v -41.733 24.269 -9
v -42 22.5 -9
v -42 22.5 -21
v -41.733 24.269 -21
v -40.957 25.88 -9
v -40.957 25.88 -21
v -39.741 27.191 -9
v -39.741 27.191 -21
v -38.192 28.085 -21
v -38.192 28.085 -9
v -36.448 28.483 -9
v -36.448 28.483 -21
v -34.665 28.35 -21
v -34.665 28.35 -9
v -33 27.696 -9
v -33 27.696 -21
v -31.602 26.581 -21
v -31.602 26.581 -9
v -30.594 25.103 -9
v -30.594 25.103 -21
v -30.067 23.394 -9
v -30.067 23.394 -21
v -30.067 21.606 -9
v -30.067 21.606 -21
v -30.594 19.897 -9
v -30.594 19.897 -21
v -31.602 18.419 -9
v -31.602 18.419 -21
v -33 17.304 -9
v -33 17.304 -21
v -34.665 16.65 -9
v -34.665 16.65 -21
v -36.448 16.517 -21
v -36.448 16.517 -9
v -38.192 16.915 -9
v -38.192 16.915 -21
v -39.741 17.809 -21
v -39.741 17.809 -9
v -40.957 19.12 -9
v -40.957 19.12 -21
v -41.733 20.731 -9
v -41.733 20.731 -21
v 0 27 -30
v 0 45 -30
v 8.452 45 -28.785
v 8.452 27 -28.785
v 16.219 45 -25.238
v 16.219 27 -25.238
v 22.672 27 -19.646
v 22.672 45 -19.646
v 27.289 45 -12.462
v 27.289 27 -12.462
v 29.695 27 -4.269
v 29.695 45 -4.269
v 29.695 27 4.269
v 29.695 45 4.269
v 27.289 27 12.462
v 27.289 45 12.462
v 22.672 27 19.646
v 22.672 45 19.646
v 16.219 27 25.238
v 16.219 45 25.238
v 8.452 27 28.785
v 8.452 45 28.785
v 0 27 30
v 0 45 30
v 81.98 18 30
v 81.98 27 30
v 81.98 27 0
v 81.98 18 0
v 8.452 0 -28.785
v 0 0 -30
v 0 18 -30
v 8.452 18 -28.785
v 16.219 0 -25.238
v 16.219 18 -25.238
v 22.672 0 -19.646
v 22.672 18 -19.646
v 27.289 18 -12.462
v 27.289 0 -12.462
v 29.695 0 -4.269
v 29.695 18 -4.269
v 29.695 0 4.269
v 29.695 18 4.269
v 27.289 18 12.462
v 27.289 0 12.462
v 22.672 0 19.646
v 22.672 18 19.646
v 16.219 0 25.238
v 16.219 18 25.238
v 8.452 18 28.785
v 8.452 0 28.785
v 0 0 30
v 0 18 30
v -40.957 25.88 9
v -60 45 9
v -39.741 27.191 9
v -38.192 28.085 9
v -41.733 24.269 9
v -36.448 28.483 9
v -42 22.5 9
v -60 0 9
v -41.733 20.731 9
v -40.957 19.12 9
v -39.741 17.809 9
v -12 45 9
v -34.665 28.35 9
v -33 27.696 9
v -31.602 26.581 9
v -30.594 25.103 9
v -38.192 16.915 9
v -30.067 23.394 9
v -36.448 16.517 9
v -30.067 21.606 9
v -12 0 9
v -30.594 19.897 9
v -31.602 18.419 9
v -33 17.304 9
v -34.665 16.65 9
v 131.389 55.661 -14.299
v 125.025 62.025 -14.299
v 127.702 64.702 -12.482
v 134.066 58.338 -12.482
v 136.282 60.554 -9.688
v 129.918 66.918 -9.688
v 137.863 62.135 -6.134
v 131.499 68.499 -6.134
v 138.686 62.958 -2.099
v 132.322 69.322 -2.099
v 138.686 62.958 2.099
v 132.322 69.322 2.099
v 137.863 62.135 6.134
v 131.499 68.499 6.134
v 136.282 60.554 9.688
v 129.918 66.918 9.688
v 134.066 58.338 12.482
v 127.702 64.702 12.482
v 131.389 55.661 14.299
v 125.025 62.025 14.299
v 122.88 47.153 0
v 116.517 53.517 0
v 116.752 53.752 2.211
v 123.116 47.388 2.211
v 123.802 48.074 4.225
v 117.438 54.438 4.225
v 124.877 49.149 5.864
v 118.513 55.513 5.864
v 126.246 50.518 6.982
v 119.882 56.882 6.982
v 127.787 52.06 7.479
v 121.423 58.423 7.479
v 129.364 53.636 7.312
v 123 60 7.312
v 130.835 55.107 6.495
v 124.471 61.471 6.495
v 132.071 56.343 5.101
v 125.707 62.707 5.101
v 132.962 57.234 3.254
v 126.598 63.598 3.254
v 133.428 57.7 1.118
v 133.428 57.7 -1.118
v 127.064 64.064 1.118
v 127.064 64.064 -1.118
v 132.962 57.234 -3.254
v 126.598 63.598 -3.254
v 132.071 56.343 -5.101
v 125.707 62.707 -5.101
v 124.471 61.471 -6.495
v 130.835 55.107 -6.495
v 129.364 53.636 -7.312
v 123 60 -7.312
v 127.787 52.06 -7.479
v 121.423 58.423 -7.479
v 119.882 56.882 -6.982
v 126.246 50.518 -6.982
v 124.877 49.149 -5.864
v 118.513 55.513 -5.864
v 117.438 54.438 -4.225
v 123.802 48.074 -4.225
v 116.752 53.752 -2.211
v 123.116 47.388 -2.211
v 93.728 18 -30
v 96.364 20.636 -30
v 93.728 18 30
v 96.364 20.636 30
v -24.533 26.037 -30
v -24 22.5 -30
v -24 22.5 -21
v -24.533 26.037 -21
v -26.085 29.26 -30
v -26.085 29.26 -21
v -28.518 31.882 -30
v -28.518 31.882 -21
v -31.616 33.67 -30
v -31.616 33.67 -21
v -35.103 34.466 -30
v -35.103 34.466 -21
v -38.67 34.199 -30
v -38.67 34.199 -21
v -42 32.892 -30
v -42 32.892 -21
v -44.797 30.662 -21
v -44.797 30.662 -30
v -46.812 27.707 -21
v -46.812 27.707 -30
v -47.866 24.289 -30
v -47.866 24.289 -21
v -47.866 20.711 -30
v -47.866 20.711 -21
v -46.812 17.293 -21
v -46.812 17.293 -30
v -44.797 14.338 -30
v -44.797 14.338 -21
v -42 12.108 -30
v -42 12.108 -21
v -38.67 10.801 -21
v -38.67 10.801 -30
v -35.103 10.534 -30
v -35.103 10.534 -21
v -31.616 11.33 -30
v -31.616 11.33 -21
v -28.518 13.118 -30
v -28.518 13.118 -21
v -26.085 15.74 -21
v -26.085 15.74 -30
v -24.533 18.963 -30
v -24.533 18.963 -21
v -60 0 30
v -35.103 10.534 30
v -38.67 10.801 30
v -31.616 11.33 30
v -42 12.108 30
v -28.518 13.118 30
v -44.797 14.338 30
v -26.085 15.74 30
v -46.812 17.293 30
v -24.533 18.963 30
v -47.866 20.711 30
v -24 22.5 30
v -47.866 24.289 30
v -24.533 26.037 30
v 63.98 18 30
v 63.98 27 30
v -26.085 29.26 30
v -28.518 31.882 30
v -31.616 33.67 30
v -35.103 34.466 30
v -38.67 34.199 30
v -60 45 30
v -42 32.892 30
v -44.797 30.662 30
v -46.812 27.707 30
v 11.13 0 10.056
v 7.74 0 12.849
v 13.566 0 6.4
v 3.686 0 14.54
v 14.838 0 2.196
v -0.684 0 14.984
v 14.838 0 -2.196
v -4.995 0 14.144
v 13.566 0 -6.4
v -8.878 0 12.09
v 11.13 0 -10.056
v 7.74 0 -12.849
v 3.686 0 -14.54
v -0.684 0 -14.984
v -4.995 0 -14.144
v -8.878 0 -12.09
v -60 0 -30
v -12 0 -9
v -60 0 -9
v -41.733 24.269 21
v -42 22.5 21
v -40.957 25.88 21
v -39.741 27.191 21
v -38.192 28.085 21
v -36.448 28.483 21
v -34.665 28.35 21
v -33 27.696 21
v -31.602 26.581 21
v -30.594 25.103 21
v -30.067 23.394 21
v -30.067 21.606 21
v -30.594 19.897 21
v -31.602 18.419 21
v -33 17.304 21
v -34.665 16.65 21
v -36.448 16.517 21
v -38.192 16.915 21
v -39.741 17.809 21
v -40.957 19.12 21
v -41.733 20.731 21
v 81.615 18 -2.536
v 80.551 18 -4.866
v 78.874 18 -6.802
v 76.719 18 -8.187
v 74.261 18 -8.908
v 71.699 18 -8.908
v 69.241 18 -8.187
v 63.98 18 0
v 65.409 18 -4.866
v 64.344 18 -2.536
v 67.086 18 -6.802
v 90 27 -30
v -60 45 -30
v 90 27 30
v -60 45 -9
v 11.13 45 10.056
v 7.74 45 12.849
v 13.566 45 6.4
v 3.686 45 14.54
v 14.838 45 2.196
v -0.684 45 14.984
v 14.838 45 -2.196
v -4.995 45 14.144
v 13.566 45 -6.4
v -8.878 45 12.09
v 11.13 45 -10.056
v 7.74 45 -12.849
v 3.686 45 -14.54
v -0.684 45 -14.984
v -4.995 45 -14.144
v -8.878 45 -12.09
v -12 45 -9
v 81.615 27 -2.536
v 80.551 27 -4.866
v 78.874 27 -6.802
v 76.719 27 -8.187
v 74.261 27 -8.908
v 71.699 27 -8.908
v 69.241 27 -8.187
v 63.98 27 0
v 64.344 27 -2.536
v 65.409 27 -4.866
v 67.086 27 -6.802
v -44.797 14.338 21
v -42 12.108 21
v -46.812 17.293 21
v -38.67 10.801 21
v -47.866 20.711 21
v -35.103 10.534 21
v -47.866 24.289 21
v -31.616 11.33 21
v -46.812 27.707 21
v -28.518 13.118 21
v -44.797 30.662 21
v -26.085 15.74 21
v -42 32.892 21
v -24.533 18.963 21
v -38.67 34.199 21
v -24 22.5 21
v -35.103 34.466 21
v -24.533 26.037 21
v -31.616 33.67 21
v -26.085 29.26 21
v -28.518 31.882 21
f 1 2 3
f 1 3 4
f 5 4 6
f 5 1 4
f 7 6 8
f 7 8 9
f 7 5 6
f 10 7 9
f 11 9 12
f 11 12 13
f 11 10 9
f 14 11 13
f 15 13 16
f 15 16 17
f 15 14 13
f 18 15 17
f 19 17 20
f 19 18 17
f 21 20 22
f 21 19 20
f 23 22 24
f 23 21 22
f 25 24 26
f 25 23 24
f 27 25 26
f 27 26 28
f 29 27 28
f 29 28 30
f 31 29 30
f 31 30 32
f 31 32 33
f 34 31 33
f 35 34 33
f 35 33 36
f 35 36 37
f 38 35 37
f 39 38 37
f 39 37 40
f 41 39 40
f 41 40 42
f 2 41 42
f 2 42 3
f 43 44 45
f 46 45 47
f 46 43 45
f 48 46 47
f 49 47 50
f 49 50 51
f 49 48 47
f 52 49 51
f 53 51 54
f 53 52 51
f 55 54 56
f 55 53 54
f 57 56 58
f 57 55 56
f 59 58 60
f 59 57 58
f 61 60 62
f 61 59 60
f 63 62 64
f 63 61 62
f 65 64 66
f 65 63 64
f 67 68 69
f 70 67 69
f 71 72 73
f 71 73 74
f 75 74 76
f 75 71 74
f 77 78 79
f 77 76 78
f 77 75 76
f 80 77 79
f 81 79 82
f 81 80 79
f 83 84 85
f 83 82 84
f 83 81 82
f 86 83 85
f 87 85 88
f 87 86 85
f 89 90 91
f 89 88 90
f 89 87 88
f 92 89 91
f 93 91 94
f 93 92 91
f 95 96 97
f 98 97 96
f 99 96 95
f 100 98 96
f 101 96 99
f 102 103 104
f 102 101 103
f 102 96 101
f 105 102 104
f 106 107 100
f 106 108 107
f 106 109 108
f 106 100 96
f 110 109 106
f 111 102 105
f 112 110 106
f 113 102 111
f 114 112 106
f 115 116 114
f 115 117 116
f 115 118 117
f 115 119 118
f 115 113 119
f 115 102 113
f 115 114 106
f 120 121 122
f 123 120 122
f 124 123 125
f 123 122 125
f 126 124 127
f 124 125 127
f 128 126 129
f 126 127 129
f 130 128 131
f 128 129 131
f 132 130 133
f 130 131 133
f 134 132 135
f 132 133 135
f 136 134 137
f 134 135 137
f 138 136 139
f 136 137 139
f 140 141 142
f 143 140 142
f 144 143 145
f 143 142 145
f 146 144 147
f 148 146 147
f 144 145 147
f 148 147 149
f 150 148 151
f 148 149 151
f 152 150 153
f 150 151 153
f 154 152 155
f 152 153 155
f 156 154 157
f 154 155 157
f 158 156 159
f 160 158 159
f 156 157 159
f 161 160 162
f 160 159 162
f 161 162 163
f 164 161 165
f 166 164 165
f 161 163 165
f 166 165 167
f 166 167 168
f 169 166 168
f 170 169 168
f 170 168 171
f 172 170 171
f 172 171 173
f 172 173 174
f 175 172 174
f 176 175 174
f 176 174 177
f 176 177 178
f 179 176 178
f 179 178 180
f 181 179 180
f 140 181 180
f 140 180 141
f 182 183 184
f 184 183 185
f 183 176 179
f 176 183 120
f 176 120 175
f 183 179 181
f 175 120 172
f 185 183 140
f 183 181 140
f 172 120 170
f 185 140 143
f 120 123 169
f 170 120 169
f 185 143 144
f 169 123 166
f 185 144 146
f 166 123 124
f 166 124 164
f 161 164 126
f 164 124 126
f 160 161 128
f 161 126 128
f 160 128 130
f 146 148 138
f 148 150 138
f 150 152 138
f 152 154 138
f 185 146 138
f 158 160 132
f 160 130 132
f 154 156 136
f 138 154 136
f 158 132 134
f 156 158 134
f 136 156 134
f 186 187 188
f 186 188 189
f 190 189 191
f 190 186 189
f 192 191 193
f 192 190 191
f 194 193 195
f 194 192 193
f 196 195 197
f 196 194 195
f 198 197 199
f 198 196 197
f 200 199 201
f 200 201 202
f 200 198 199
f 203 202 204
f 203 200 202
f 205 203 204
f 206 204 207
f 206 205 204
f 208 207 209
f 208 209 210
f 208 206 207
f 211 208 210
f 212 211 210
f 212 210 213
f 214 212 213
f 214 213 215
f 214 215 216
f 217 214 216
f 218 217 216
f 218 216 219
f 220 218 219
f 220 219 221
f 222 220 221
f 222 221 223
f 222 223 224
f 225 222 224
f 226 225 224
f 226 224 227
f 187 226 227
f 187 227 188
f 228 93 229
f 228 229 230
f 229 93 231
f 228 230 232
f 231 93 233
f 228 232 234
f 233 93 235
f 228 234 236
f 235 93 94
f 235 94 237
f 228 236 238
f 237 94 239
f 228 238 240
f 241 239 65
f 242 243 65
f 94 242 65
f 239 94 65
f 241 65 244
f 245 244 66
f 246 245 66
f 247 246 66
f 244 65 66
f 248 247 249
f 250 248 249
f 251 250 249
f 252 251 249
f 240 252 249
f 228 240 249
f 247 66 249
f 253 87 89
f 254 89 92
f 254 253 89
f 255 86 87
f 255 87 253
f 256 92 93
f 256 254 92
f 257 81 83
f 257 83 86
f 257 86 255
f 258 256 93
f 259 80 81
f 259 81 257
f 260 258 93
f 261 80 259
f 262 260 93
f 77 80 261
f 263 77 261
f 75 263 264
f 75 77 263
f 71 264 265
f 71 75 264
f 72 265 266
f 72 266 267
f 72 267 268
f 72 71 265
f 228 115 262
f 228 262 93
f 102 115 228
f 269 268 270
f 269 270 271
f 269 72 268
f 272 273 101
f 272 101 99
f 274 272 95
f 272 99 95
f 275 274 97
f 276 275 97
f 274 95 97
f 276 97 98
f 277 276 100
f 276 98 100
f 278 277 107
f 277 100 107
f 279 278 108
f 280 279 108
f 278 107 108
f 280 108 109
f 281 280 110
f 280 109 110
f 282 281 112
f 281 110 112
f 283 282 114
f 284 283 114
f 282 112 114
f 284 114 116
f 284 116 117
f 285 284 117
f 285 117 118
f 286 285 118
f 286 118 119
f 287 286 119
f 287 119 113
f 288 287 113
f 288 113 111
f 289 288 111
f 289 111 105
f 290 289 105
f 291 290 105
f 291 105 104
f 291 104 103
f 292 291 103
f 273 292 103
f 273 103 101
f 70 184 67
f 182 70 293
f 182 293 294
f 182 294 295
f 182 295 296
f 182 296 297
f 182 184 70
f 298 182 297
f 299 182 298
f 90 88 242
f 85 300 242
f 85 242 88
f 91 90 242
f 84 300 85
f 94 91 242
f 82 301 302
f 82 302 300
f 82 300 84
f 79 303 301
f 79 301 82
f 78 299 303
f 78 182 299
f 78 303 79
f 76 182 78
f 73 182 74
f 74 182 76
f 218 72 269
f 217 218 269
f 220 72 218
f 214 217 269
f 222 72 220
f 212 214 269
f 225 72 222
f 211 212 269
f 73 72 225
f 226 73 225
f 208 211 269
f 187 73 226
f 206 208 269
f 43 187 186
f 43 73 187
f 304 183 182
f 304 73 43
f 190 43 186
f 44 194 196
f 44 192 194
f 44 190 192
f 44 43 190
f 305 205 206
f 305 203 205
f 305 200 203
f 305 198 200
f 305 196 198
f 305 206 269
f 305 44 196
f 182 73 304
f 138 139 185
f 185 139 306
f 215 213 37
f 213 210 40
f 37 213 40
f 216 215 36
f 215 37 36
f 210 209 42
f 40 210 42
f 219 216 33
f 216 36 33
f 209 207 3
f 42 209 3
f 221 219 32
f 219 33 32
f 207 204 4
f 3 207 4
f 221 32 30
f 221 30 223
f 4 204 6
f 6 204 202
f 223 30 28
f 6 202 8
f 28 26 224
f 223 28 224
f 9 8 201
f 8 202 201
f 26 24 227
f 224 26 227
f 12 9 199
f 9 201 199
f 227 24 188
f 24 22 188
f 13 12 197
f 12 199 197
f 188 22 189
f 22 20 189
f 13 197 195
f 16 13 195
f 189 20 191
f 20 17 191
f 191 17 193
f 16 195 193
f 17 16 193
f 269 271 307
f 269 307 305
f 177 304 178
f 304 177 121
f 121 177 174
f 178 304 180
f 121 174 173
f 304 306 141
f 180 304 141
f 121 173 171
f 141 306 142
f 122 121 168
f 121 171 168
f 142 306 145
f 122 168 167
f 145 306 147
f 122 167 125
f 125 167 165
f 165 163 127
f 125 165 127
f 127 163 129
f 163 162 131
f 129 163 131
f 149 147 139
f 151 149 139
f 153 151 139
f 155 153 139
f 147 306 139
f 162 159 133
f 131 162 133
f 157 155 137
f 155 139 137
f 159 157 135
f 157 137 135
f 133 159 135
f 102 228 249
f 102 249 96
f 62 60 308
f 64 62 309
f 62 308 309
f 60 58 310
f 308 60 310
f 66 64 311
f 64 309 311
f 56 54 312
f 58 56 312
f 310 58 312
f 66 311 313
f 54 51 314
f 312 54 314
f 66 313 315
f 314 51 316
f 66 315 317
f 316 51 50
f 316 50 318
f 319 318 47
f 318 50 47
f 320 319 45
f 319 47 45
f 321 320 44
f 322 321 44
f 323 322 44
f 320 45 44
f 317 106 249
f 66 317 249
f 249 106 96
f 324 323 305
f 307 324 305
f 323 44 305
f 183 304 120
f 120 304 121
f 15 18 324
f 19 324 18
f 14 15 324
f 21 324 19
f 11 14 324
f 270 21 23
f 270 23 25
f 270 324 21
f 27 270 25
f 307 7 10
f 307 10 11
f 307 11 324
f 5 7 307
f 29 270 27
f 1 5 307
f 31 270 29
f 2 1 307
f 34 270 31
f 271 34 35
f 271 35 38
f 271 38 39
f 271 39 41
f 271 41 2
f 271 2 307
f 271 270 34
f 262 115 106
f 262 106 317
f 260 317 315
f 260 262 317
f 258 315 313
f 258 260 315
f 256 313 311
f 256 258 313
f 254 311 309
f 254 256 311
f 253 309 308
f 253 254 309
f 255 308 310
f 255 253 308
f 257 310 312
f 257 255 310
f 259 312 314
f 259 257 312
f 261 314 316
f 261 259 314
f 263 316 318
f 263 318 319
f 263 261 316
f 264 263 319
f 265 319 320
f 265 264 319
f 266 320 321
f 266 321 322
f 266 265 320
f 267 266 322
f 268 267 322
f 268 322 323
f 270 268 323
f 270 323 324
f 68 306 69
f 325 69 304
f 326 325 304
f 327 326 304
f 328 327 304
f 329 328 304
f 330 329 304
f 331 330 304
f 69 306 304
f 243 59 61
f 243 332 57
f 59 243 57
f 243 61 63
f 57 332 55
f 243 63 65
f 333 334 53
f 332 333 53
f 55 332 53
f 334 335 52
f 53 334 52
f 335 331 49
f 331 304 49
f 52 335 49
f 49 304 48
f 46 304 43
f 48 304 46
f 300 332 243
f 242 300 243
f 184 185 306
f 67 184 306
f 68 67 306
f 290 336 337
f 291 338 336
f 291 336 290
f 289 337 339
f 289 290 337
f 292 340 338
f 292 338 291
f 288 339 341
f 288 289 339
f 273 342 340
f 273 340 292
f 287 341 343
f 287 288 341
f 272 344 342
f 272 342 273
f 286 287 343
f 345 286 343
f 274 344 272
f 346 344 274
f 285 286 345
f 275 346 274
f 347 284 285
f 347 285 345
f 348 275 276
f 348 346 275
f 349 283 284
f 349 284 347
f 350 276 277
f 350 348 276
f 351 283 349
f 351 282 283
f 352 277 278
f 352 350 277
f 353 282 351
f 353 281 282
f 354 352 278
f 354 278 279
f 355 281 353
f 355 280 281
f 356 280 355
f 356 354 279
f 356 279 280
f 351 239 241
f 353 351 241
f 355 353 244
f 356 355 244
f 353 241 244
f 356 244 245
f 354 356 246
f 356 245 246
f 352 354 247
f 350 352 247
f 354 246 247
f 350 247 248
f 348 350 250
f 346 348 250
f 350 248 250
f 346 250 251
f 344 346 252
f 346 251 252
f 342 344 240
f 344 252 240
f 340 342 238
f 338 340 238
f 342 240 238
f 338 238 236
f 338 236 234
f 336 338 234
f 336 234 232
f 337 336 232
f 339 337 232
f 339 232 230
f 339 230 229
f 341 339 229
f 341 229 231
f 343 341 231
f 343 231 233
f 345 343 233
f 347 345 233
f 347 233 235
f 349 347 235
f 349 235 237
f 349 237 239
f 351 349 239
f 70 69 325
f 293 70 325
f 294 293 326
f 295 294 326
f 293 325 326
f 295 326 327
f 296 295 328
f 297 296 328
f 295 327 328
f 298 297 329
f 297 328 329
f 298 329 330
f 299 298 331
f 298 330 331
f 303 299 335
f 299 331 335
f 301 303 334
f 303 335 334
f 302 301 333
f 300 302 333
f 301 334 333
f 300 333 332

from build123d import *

# Parameters (mm, degrees)
BOSS_EXTRUDE1_DEPTH                                  = 45
CBORE_FOR_M24_HEX_SOCKET_HEAD_CAP_SCREW1_D           = 12
CBORE_FOR_M24_HEX_SOCKET_HEAD_CAP_SCREW1_DEPTH       = 21
CBORE_FOR_M24_HEX_SOCKET_HEAD_CAP_SCREW1_CBORE_D     = 24
CBORE_FOR_M24_HEX_SOCKET_HEAD_CAP_SCREW1_CBORE_DEPTH = 9
BOSS_EXTRUDE2_DEPTH                                  = 4.5
BOSS_EXTRUDE3_DEPTH                                  = 9
SKETCH7_W                                            = 60
SKETCH7_H                                            = 9
BOSS_EXTRUDE4_DEPTH                                  = 9
CUT_EXTRUDE2_START                                   = -60
CUT_EXTRUDE2_DEPTH                                   = 60
SKETCH9_R                                            = 7.5
CUT_EXTRUDE3_DEPTH                                   = 151.324191827
CUT_EXTRUDE4_DEPTH                                   = 149.198401551


# Read off the part's stored shape, not the designer's step: Cut-Extrude2
with BuildPart() as part:
    # Sketch1 → Boss-Extrude1 (new body)
    with BuildSketch(Plane(origin=(0, 0, 0), x_dir=(1, 0, 0), z_dir=(0, 1, 0))):
        with BuildLine():
            Line((0, -30), (-60, -30))
            Line((-60, -30), (-60, -9))
            Line((-60, -9), (-12, -9))
            ThreePointArc((-12, -9), (15, 0), (-12, 9))
            Line((-12, 9), (-60, 9))
            Line((-60, 9), (-60, 30))
            Line((-60, 30), (0, 30))
            ThreePointArc((0, 30), (30, 0), (0, -30))
        make_face()
    extrude(amount=BOSS_EXTRUDE1_DEPTH)

    # CBORE for M24 Hex Socket Head Cap Screw1
    with Locations(Plane.XY.offset(30)):
        with Locations((-36, 22.5)):
            cbore_for_m24_hex_socket_head_cap_screw1 = CounterBoreHole(CBORE_FOR_M24_HEX_SOCKET_HEAD_CAP_SCREW1_D / 2, CBORE_FOR_M24_HEX_SOCKET_HEAD_CAP_SCREW1_CBORE_D / 2, CBORE_FOR_M24_HEX_SOCKET_HEAD_CAP_SCREW1_CBORE_DEPTH, depth=CBORE_FOR_M24_HEX_SOCKET_HEAD_CAP_SCREW1_DEPTH)

    # Mirror1: CBORE for M24 Hex Socket Head Cap Screw1 across plane
    add(cbore_for_m24_hex_socket_head_cap_screw1.mirror(Plane.XY), mode=Mode.SUBTRACT)

    # Sketch4 → Boss-Extrude2 (add, symmetric)
    with BuildSketch(Plane(origin=(0, 22.5, 0), x_dir=(1, 0, 0), z_dir=(0, 1, 0))):
        with BuildLine():
            Line((0, 30), (90, 30))
            Line((90, 30), (90, -30))
            Line((90, -30), (0, -30))
            ThreePointArc((0, -30), (30, 0), (0, 30))
        make_face()
    extrude(amount=BOSS_EXTRUDE2_DEPTH, both=True)



with BuildPart() as body_2:
    # Sketch6 → Boss-Extrude3 (new body)
    with BuildSketch(Plane(origin=(31.5, -31.5, 0), x_dir=(0.7071067811865462, 0.7071067811865489, 0), z_dir=(0.7071067811865489, -0.7071067811865462, 0))):
        with BuildLine():
            Line((82.731493399, 30), (82.731493399, -30))
            Line((82.731493399, -30), (132.264035588, -14.298813283))
            ThreePointArc((132.264035588, -14.298813283), (142.731493399, 0), (132.264035588, 14.298813283))
            Line((132.264035588, 14.298813283), (82.731493399, 30))
        make_face()
    extrude(amount=BOSS_EXTRUDE3_DEPTH)


with BuildPart() as part_1:
    add(part.part)

    add(body_2.part)  # Boss-Extrude4 merges body 2
    # Sketch7 → Boss-Extrude4 (add)
    with BuildSketch(Plane(origin=(58.5, 58.5, 0), x_dir=(0, 0, 1), z_dir=(-0.7071067811865462, -0.7071067811865488, 0))):
        with Locations((0, -49.047727215)):
            Rectangle(SKETCH7_W, SKETCH7_H)
    extrude(amount=BOSS_EXTRUDE4_DEPTH)

    # Cut-Extrude2 outline → Cut-Extrude2 (cut)
    with BuildSketch(Plane.XY.offset(30).offset(CUT_EXTRUDE2_START)):
        Polygon((90, 14.272077939), (93.727922061, 18), (86.272077939, 18), align=None)
    extrude(amount=CUT_EXTRUDE2_DEPTH, mode=Mode.SUBTRACT)

    # Sketch9 → Cut-Extrude3 (cut, through all)
    with BuildSketch(Plane(origin=(31.5, -31.5, 0), x_dir=(0, 0, 1), z_dir=(-0.7071067811865488, 0.7071067811865464, 0))):
        with Locations(Location((0, 127.731493399, 0), (0, 0, 270))):
            Circle(SKETCH9_R)
    extrude(amount=-CUT_EXTRUDE3_DEPTH, mode=Mode.SUBTRACT)

    # Sketch10 → Cut-Extrude4 (cut, through all)
    with BuildSketch(Plane(origin=(0, 27, 0), x_dir=(1, 0, 0), z_dir=(0, 1, 0))):
        with BuildLine():
            ThreePointArc((81.979848708, 0), (72.979848708, 9), (63.979848708, 0))
            Line((63.979848708, 0), (63.979848708, -30))
            Line((63.979848708, -30), (81.979848708, -30))
            Line((81.979848708, -30), (81.979848708, 0))
        make_face()
    extrude(amount=-CUT_EXTRUDE4_DEPTH, mode=Mode.SUBTRACT)


solid = part_1.part
